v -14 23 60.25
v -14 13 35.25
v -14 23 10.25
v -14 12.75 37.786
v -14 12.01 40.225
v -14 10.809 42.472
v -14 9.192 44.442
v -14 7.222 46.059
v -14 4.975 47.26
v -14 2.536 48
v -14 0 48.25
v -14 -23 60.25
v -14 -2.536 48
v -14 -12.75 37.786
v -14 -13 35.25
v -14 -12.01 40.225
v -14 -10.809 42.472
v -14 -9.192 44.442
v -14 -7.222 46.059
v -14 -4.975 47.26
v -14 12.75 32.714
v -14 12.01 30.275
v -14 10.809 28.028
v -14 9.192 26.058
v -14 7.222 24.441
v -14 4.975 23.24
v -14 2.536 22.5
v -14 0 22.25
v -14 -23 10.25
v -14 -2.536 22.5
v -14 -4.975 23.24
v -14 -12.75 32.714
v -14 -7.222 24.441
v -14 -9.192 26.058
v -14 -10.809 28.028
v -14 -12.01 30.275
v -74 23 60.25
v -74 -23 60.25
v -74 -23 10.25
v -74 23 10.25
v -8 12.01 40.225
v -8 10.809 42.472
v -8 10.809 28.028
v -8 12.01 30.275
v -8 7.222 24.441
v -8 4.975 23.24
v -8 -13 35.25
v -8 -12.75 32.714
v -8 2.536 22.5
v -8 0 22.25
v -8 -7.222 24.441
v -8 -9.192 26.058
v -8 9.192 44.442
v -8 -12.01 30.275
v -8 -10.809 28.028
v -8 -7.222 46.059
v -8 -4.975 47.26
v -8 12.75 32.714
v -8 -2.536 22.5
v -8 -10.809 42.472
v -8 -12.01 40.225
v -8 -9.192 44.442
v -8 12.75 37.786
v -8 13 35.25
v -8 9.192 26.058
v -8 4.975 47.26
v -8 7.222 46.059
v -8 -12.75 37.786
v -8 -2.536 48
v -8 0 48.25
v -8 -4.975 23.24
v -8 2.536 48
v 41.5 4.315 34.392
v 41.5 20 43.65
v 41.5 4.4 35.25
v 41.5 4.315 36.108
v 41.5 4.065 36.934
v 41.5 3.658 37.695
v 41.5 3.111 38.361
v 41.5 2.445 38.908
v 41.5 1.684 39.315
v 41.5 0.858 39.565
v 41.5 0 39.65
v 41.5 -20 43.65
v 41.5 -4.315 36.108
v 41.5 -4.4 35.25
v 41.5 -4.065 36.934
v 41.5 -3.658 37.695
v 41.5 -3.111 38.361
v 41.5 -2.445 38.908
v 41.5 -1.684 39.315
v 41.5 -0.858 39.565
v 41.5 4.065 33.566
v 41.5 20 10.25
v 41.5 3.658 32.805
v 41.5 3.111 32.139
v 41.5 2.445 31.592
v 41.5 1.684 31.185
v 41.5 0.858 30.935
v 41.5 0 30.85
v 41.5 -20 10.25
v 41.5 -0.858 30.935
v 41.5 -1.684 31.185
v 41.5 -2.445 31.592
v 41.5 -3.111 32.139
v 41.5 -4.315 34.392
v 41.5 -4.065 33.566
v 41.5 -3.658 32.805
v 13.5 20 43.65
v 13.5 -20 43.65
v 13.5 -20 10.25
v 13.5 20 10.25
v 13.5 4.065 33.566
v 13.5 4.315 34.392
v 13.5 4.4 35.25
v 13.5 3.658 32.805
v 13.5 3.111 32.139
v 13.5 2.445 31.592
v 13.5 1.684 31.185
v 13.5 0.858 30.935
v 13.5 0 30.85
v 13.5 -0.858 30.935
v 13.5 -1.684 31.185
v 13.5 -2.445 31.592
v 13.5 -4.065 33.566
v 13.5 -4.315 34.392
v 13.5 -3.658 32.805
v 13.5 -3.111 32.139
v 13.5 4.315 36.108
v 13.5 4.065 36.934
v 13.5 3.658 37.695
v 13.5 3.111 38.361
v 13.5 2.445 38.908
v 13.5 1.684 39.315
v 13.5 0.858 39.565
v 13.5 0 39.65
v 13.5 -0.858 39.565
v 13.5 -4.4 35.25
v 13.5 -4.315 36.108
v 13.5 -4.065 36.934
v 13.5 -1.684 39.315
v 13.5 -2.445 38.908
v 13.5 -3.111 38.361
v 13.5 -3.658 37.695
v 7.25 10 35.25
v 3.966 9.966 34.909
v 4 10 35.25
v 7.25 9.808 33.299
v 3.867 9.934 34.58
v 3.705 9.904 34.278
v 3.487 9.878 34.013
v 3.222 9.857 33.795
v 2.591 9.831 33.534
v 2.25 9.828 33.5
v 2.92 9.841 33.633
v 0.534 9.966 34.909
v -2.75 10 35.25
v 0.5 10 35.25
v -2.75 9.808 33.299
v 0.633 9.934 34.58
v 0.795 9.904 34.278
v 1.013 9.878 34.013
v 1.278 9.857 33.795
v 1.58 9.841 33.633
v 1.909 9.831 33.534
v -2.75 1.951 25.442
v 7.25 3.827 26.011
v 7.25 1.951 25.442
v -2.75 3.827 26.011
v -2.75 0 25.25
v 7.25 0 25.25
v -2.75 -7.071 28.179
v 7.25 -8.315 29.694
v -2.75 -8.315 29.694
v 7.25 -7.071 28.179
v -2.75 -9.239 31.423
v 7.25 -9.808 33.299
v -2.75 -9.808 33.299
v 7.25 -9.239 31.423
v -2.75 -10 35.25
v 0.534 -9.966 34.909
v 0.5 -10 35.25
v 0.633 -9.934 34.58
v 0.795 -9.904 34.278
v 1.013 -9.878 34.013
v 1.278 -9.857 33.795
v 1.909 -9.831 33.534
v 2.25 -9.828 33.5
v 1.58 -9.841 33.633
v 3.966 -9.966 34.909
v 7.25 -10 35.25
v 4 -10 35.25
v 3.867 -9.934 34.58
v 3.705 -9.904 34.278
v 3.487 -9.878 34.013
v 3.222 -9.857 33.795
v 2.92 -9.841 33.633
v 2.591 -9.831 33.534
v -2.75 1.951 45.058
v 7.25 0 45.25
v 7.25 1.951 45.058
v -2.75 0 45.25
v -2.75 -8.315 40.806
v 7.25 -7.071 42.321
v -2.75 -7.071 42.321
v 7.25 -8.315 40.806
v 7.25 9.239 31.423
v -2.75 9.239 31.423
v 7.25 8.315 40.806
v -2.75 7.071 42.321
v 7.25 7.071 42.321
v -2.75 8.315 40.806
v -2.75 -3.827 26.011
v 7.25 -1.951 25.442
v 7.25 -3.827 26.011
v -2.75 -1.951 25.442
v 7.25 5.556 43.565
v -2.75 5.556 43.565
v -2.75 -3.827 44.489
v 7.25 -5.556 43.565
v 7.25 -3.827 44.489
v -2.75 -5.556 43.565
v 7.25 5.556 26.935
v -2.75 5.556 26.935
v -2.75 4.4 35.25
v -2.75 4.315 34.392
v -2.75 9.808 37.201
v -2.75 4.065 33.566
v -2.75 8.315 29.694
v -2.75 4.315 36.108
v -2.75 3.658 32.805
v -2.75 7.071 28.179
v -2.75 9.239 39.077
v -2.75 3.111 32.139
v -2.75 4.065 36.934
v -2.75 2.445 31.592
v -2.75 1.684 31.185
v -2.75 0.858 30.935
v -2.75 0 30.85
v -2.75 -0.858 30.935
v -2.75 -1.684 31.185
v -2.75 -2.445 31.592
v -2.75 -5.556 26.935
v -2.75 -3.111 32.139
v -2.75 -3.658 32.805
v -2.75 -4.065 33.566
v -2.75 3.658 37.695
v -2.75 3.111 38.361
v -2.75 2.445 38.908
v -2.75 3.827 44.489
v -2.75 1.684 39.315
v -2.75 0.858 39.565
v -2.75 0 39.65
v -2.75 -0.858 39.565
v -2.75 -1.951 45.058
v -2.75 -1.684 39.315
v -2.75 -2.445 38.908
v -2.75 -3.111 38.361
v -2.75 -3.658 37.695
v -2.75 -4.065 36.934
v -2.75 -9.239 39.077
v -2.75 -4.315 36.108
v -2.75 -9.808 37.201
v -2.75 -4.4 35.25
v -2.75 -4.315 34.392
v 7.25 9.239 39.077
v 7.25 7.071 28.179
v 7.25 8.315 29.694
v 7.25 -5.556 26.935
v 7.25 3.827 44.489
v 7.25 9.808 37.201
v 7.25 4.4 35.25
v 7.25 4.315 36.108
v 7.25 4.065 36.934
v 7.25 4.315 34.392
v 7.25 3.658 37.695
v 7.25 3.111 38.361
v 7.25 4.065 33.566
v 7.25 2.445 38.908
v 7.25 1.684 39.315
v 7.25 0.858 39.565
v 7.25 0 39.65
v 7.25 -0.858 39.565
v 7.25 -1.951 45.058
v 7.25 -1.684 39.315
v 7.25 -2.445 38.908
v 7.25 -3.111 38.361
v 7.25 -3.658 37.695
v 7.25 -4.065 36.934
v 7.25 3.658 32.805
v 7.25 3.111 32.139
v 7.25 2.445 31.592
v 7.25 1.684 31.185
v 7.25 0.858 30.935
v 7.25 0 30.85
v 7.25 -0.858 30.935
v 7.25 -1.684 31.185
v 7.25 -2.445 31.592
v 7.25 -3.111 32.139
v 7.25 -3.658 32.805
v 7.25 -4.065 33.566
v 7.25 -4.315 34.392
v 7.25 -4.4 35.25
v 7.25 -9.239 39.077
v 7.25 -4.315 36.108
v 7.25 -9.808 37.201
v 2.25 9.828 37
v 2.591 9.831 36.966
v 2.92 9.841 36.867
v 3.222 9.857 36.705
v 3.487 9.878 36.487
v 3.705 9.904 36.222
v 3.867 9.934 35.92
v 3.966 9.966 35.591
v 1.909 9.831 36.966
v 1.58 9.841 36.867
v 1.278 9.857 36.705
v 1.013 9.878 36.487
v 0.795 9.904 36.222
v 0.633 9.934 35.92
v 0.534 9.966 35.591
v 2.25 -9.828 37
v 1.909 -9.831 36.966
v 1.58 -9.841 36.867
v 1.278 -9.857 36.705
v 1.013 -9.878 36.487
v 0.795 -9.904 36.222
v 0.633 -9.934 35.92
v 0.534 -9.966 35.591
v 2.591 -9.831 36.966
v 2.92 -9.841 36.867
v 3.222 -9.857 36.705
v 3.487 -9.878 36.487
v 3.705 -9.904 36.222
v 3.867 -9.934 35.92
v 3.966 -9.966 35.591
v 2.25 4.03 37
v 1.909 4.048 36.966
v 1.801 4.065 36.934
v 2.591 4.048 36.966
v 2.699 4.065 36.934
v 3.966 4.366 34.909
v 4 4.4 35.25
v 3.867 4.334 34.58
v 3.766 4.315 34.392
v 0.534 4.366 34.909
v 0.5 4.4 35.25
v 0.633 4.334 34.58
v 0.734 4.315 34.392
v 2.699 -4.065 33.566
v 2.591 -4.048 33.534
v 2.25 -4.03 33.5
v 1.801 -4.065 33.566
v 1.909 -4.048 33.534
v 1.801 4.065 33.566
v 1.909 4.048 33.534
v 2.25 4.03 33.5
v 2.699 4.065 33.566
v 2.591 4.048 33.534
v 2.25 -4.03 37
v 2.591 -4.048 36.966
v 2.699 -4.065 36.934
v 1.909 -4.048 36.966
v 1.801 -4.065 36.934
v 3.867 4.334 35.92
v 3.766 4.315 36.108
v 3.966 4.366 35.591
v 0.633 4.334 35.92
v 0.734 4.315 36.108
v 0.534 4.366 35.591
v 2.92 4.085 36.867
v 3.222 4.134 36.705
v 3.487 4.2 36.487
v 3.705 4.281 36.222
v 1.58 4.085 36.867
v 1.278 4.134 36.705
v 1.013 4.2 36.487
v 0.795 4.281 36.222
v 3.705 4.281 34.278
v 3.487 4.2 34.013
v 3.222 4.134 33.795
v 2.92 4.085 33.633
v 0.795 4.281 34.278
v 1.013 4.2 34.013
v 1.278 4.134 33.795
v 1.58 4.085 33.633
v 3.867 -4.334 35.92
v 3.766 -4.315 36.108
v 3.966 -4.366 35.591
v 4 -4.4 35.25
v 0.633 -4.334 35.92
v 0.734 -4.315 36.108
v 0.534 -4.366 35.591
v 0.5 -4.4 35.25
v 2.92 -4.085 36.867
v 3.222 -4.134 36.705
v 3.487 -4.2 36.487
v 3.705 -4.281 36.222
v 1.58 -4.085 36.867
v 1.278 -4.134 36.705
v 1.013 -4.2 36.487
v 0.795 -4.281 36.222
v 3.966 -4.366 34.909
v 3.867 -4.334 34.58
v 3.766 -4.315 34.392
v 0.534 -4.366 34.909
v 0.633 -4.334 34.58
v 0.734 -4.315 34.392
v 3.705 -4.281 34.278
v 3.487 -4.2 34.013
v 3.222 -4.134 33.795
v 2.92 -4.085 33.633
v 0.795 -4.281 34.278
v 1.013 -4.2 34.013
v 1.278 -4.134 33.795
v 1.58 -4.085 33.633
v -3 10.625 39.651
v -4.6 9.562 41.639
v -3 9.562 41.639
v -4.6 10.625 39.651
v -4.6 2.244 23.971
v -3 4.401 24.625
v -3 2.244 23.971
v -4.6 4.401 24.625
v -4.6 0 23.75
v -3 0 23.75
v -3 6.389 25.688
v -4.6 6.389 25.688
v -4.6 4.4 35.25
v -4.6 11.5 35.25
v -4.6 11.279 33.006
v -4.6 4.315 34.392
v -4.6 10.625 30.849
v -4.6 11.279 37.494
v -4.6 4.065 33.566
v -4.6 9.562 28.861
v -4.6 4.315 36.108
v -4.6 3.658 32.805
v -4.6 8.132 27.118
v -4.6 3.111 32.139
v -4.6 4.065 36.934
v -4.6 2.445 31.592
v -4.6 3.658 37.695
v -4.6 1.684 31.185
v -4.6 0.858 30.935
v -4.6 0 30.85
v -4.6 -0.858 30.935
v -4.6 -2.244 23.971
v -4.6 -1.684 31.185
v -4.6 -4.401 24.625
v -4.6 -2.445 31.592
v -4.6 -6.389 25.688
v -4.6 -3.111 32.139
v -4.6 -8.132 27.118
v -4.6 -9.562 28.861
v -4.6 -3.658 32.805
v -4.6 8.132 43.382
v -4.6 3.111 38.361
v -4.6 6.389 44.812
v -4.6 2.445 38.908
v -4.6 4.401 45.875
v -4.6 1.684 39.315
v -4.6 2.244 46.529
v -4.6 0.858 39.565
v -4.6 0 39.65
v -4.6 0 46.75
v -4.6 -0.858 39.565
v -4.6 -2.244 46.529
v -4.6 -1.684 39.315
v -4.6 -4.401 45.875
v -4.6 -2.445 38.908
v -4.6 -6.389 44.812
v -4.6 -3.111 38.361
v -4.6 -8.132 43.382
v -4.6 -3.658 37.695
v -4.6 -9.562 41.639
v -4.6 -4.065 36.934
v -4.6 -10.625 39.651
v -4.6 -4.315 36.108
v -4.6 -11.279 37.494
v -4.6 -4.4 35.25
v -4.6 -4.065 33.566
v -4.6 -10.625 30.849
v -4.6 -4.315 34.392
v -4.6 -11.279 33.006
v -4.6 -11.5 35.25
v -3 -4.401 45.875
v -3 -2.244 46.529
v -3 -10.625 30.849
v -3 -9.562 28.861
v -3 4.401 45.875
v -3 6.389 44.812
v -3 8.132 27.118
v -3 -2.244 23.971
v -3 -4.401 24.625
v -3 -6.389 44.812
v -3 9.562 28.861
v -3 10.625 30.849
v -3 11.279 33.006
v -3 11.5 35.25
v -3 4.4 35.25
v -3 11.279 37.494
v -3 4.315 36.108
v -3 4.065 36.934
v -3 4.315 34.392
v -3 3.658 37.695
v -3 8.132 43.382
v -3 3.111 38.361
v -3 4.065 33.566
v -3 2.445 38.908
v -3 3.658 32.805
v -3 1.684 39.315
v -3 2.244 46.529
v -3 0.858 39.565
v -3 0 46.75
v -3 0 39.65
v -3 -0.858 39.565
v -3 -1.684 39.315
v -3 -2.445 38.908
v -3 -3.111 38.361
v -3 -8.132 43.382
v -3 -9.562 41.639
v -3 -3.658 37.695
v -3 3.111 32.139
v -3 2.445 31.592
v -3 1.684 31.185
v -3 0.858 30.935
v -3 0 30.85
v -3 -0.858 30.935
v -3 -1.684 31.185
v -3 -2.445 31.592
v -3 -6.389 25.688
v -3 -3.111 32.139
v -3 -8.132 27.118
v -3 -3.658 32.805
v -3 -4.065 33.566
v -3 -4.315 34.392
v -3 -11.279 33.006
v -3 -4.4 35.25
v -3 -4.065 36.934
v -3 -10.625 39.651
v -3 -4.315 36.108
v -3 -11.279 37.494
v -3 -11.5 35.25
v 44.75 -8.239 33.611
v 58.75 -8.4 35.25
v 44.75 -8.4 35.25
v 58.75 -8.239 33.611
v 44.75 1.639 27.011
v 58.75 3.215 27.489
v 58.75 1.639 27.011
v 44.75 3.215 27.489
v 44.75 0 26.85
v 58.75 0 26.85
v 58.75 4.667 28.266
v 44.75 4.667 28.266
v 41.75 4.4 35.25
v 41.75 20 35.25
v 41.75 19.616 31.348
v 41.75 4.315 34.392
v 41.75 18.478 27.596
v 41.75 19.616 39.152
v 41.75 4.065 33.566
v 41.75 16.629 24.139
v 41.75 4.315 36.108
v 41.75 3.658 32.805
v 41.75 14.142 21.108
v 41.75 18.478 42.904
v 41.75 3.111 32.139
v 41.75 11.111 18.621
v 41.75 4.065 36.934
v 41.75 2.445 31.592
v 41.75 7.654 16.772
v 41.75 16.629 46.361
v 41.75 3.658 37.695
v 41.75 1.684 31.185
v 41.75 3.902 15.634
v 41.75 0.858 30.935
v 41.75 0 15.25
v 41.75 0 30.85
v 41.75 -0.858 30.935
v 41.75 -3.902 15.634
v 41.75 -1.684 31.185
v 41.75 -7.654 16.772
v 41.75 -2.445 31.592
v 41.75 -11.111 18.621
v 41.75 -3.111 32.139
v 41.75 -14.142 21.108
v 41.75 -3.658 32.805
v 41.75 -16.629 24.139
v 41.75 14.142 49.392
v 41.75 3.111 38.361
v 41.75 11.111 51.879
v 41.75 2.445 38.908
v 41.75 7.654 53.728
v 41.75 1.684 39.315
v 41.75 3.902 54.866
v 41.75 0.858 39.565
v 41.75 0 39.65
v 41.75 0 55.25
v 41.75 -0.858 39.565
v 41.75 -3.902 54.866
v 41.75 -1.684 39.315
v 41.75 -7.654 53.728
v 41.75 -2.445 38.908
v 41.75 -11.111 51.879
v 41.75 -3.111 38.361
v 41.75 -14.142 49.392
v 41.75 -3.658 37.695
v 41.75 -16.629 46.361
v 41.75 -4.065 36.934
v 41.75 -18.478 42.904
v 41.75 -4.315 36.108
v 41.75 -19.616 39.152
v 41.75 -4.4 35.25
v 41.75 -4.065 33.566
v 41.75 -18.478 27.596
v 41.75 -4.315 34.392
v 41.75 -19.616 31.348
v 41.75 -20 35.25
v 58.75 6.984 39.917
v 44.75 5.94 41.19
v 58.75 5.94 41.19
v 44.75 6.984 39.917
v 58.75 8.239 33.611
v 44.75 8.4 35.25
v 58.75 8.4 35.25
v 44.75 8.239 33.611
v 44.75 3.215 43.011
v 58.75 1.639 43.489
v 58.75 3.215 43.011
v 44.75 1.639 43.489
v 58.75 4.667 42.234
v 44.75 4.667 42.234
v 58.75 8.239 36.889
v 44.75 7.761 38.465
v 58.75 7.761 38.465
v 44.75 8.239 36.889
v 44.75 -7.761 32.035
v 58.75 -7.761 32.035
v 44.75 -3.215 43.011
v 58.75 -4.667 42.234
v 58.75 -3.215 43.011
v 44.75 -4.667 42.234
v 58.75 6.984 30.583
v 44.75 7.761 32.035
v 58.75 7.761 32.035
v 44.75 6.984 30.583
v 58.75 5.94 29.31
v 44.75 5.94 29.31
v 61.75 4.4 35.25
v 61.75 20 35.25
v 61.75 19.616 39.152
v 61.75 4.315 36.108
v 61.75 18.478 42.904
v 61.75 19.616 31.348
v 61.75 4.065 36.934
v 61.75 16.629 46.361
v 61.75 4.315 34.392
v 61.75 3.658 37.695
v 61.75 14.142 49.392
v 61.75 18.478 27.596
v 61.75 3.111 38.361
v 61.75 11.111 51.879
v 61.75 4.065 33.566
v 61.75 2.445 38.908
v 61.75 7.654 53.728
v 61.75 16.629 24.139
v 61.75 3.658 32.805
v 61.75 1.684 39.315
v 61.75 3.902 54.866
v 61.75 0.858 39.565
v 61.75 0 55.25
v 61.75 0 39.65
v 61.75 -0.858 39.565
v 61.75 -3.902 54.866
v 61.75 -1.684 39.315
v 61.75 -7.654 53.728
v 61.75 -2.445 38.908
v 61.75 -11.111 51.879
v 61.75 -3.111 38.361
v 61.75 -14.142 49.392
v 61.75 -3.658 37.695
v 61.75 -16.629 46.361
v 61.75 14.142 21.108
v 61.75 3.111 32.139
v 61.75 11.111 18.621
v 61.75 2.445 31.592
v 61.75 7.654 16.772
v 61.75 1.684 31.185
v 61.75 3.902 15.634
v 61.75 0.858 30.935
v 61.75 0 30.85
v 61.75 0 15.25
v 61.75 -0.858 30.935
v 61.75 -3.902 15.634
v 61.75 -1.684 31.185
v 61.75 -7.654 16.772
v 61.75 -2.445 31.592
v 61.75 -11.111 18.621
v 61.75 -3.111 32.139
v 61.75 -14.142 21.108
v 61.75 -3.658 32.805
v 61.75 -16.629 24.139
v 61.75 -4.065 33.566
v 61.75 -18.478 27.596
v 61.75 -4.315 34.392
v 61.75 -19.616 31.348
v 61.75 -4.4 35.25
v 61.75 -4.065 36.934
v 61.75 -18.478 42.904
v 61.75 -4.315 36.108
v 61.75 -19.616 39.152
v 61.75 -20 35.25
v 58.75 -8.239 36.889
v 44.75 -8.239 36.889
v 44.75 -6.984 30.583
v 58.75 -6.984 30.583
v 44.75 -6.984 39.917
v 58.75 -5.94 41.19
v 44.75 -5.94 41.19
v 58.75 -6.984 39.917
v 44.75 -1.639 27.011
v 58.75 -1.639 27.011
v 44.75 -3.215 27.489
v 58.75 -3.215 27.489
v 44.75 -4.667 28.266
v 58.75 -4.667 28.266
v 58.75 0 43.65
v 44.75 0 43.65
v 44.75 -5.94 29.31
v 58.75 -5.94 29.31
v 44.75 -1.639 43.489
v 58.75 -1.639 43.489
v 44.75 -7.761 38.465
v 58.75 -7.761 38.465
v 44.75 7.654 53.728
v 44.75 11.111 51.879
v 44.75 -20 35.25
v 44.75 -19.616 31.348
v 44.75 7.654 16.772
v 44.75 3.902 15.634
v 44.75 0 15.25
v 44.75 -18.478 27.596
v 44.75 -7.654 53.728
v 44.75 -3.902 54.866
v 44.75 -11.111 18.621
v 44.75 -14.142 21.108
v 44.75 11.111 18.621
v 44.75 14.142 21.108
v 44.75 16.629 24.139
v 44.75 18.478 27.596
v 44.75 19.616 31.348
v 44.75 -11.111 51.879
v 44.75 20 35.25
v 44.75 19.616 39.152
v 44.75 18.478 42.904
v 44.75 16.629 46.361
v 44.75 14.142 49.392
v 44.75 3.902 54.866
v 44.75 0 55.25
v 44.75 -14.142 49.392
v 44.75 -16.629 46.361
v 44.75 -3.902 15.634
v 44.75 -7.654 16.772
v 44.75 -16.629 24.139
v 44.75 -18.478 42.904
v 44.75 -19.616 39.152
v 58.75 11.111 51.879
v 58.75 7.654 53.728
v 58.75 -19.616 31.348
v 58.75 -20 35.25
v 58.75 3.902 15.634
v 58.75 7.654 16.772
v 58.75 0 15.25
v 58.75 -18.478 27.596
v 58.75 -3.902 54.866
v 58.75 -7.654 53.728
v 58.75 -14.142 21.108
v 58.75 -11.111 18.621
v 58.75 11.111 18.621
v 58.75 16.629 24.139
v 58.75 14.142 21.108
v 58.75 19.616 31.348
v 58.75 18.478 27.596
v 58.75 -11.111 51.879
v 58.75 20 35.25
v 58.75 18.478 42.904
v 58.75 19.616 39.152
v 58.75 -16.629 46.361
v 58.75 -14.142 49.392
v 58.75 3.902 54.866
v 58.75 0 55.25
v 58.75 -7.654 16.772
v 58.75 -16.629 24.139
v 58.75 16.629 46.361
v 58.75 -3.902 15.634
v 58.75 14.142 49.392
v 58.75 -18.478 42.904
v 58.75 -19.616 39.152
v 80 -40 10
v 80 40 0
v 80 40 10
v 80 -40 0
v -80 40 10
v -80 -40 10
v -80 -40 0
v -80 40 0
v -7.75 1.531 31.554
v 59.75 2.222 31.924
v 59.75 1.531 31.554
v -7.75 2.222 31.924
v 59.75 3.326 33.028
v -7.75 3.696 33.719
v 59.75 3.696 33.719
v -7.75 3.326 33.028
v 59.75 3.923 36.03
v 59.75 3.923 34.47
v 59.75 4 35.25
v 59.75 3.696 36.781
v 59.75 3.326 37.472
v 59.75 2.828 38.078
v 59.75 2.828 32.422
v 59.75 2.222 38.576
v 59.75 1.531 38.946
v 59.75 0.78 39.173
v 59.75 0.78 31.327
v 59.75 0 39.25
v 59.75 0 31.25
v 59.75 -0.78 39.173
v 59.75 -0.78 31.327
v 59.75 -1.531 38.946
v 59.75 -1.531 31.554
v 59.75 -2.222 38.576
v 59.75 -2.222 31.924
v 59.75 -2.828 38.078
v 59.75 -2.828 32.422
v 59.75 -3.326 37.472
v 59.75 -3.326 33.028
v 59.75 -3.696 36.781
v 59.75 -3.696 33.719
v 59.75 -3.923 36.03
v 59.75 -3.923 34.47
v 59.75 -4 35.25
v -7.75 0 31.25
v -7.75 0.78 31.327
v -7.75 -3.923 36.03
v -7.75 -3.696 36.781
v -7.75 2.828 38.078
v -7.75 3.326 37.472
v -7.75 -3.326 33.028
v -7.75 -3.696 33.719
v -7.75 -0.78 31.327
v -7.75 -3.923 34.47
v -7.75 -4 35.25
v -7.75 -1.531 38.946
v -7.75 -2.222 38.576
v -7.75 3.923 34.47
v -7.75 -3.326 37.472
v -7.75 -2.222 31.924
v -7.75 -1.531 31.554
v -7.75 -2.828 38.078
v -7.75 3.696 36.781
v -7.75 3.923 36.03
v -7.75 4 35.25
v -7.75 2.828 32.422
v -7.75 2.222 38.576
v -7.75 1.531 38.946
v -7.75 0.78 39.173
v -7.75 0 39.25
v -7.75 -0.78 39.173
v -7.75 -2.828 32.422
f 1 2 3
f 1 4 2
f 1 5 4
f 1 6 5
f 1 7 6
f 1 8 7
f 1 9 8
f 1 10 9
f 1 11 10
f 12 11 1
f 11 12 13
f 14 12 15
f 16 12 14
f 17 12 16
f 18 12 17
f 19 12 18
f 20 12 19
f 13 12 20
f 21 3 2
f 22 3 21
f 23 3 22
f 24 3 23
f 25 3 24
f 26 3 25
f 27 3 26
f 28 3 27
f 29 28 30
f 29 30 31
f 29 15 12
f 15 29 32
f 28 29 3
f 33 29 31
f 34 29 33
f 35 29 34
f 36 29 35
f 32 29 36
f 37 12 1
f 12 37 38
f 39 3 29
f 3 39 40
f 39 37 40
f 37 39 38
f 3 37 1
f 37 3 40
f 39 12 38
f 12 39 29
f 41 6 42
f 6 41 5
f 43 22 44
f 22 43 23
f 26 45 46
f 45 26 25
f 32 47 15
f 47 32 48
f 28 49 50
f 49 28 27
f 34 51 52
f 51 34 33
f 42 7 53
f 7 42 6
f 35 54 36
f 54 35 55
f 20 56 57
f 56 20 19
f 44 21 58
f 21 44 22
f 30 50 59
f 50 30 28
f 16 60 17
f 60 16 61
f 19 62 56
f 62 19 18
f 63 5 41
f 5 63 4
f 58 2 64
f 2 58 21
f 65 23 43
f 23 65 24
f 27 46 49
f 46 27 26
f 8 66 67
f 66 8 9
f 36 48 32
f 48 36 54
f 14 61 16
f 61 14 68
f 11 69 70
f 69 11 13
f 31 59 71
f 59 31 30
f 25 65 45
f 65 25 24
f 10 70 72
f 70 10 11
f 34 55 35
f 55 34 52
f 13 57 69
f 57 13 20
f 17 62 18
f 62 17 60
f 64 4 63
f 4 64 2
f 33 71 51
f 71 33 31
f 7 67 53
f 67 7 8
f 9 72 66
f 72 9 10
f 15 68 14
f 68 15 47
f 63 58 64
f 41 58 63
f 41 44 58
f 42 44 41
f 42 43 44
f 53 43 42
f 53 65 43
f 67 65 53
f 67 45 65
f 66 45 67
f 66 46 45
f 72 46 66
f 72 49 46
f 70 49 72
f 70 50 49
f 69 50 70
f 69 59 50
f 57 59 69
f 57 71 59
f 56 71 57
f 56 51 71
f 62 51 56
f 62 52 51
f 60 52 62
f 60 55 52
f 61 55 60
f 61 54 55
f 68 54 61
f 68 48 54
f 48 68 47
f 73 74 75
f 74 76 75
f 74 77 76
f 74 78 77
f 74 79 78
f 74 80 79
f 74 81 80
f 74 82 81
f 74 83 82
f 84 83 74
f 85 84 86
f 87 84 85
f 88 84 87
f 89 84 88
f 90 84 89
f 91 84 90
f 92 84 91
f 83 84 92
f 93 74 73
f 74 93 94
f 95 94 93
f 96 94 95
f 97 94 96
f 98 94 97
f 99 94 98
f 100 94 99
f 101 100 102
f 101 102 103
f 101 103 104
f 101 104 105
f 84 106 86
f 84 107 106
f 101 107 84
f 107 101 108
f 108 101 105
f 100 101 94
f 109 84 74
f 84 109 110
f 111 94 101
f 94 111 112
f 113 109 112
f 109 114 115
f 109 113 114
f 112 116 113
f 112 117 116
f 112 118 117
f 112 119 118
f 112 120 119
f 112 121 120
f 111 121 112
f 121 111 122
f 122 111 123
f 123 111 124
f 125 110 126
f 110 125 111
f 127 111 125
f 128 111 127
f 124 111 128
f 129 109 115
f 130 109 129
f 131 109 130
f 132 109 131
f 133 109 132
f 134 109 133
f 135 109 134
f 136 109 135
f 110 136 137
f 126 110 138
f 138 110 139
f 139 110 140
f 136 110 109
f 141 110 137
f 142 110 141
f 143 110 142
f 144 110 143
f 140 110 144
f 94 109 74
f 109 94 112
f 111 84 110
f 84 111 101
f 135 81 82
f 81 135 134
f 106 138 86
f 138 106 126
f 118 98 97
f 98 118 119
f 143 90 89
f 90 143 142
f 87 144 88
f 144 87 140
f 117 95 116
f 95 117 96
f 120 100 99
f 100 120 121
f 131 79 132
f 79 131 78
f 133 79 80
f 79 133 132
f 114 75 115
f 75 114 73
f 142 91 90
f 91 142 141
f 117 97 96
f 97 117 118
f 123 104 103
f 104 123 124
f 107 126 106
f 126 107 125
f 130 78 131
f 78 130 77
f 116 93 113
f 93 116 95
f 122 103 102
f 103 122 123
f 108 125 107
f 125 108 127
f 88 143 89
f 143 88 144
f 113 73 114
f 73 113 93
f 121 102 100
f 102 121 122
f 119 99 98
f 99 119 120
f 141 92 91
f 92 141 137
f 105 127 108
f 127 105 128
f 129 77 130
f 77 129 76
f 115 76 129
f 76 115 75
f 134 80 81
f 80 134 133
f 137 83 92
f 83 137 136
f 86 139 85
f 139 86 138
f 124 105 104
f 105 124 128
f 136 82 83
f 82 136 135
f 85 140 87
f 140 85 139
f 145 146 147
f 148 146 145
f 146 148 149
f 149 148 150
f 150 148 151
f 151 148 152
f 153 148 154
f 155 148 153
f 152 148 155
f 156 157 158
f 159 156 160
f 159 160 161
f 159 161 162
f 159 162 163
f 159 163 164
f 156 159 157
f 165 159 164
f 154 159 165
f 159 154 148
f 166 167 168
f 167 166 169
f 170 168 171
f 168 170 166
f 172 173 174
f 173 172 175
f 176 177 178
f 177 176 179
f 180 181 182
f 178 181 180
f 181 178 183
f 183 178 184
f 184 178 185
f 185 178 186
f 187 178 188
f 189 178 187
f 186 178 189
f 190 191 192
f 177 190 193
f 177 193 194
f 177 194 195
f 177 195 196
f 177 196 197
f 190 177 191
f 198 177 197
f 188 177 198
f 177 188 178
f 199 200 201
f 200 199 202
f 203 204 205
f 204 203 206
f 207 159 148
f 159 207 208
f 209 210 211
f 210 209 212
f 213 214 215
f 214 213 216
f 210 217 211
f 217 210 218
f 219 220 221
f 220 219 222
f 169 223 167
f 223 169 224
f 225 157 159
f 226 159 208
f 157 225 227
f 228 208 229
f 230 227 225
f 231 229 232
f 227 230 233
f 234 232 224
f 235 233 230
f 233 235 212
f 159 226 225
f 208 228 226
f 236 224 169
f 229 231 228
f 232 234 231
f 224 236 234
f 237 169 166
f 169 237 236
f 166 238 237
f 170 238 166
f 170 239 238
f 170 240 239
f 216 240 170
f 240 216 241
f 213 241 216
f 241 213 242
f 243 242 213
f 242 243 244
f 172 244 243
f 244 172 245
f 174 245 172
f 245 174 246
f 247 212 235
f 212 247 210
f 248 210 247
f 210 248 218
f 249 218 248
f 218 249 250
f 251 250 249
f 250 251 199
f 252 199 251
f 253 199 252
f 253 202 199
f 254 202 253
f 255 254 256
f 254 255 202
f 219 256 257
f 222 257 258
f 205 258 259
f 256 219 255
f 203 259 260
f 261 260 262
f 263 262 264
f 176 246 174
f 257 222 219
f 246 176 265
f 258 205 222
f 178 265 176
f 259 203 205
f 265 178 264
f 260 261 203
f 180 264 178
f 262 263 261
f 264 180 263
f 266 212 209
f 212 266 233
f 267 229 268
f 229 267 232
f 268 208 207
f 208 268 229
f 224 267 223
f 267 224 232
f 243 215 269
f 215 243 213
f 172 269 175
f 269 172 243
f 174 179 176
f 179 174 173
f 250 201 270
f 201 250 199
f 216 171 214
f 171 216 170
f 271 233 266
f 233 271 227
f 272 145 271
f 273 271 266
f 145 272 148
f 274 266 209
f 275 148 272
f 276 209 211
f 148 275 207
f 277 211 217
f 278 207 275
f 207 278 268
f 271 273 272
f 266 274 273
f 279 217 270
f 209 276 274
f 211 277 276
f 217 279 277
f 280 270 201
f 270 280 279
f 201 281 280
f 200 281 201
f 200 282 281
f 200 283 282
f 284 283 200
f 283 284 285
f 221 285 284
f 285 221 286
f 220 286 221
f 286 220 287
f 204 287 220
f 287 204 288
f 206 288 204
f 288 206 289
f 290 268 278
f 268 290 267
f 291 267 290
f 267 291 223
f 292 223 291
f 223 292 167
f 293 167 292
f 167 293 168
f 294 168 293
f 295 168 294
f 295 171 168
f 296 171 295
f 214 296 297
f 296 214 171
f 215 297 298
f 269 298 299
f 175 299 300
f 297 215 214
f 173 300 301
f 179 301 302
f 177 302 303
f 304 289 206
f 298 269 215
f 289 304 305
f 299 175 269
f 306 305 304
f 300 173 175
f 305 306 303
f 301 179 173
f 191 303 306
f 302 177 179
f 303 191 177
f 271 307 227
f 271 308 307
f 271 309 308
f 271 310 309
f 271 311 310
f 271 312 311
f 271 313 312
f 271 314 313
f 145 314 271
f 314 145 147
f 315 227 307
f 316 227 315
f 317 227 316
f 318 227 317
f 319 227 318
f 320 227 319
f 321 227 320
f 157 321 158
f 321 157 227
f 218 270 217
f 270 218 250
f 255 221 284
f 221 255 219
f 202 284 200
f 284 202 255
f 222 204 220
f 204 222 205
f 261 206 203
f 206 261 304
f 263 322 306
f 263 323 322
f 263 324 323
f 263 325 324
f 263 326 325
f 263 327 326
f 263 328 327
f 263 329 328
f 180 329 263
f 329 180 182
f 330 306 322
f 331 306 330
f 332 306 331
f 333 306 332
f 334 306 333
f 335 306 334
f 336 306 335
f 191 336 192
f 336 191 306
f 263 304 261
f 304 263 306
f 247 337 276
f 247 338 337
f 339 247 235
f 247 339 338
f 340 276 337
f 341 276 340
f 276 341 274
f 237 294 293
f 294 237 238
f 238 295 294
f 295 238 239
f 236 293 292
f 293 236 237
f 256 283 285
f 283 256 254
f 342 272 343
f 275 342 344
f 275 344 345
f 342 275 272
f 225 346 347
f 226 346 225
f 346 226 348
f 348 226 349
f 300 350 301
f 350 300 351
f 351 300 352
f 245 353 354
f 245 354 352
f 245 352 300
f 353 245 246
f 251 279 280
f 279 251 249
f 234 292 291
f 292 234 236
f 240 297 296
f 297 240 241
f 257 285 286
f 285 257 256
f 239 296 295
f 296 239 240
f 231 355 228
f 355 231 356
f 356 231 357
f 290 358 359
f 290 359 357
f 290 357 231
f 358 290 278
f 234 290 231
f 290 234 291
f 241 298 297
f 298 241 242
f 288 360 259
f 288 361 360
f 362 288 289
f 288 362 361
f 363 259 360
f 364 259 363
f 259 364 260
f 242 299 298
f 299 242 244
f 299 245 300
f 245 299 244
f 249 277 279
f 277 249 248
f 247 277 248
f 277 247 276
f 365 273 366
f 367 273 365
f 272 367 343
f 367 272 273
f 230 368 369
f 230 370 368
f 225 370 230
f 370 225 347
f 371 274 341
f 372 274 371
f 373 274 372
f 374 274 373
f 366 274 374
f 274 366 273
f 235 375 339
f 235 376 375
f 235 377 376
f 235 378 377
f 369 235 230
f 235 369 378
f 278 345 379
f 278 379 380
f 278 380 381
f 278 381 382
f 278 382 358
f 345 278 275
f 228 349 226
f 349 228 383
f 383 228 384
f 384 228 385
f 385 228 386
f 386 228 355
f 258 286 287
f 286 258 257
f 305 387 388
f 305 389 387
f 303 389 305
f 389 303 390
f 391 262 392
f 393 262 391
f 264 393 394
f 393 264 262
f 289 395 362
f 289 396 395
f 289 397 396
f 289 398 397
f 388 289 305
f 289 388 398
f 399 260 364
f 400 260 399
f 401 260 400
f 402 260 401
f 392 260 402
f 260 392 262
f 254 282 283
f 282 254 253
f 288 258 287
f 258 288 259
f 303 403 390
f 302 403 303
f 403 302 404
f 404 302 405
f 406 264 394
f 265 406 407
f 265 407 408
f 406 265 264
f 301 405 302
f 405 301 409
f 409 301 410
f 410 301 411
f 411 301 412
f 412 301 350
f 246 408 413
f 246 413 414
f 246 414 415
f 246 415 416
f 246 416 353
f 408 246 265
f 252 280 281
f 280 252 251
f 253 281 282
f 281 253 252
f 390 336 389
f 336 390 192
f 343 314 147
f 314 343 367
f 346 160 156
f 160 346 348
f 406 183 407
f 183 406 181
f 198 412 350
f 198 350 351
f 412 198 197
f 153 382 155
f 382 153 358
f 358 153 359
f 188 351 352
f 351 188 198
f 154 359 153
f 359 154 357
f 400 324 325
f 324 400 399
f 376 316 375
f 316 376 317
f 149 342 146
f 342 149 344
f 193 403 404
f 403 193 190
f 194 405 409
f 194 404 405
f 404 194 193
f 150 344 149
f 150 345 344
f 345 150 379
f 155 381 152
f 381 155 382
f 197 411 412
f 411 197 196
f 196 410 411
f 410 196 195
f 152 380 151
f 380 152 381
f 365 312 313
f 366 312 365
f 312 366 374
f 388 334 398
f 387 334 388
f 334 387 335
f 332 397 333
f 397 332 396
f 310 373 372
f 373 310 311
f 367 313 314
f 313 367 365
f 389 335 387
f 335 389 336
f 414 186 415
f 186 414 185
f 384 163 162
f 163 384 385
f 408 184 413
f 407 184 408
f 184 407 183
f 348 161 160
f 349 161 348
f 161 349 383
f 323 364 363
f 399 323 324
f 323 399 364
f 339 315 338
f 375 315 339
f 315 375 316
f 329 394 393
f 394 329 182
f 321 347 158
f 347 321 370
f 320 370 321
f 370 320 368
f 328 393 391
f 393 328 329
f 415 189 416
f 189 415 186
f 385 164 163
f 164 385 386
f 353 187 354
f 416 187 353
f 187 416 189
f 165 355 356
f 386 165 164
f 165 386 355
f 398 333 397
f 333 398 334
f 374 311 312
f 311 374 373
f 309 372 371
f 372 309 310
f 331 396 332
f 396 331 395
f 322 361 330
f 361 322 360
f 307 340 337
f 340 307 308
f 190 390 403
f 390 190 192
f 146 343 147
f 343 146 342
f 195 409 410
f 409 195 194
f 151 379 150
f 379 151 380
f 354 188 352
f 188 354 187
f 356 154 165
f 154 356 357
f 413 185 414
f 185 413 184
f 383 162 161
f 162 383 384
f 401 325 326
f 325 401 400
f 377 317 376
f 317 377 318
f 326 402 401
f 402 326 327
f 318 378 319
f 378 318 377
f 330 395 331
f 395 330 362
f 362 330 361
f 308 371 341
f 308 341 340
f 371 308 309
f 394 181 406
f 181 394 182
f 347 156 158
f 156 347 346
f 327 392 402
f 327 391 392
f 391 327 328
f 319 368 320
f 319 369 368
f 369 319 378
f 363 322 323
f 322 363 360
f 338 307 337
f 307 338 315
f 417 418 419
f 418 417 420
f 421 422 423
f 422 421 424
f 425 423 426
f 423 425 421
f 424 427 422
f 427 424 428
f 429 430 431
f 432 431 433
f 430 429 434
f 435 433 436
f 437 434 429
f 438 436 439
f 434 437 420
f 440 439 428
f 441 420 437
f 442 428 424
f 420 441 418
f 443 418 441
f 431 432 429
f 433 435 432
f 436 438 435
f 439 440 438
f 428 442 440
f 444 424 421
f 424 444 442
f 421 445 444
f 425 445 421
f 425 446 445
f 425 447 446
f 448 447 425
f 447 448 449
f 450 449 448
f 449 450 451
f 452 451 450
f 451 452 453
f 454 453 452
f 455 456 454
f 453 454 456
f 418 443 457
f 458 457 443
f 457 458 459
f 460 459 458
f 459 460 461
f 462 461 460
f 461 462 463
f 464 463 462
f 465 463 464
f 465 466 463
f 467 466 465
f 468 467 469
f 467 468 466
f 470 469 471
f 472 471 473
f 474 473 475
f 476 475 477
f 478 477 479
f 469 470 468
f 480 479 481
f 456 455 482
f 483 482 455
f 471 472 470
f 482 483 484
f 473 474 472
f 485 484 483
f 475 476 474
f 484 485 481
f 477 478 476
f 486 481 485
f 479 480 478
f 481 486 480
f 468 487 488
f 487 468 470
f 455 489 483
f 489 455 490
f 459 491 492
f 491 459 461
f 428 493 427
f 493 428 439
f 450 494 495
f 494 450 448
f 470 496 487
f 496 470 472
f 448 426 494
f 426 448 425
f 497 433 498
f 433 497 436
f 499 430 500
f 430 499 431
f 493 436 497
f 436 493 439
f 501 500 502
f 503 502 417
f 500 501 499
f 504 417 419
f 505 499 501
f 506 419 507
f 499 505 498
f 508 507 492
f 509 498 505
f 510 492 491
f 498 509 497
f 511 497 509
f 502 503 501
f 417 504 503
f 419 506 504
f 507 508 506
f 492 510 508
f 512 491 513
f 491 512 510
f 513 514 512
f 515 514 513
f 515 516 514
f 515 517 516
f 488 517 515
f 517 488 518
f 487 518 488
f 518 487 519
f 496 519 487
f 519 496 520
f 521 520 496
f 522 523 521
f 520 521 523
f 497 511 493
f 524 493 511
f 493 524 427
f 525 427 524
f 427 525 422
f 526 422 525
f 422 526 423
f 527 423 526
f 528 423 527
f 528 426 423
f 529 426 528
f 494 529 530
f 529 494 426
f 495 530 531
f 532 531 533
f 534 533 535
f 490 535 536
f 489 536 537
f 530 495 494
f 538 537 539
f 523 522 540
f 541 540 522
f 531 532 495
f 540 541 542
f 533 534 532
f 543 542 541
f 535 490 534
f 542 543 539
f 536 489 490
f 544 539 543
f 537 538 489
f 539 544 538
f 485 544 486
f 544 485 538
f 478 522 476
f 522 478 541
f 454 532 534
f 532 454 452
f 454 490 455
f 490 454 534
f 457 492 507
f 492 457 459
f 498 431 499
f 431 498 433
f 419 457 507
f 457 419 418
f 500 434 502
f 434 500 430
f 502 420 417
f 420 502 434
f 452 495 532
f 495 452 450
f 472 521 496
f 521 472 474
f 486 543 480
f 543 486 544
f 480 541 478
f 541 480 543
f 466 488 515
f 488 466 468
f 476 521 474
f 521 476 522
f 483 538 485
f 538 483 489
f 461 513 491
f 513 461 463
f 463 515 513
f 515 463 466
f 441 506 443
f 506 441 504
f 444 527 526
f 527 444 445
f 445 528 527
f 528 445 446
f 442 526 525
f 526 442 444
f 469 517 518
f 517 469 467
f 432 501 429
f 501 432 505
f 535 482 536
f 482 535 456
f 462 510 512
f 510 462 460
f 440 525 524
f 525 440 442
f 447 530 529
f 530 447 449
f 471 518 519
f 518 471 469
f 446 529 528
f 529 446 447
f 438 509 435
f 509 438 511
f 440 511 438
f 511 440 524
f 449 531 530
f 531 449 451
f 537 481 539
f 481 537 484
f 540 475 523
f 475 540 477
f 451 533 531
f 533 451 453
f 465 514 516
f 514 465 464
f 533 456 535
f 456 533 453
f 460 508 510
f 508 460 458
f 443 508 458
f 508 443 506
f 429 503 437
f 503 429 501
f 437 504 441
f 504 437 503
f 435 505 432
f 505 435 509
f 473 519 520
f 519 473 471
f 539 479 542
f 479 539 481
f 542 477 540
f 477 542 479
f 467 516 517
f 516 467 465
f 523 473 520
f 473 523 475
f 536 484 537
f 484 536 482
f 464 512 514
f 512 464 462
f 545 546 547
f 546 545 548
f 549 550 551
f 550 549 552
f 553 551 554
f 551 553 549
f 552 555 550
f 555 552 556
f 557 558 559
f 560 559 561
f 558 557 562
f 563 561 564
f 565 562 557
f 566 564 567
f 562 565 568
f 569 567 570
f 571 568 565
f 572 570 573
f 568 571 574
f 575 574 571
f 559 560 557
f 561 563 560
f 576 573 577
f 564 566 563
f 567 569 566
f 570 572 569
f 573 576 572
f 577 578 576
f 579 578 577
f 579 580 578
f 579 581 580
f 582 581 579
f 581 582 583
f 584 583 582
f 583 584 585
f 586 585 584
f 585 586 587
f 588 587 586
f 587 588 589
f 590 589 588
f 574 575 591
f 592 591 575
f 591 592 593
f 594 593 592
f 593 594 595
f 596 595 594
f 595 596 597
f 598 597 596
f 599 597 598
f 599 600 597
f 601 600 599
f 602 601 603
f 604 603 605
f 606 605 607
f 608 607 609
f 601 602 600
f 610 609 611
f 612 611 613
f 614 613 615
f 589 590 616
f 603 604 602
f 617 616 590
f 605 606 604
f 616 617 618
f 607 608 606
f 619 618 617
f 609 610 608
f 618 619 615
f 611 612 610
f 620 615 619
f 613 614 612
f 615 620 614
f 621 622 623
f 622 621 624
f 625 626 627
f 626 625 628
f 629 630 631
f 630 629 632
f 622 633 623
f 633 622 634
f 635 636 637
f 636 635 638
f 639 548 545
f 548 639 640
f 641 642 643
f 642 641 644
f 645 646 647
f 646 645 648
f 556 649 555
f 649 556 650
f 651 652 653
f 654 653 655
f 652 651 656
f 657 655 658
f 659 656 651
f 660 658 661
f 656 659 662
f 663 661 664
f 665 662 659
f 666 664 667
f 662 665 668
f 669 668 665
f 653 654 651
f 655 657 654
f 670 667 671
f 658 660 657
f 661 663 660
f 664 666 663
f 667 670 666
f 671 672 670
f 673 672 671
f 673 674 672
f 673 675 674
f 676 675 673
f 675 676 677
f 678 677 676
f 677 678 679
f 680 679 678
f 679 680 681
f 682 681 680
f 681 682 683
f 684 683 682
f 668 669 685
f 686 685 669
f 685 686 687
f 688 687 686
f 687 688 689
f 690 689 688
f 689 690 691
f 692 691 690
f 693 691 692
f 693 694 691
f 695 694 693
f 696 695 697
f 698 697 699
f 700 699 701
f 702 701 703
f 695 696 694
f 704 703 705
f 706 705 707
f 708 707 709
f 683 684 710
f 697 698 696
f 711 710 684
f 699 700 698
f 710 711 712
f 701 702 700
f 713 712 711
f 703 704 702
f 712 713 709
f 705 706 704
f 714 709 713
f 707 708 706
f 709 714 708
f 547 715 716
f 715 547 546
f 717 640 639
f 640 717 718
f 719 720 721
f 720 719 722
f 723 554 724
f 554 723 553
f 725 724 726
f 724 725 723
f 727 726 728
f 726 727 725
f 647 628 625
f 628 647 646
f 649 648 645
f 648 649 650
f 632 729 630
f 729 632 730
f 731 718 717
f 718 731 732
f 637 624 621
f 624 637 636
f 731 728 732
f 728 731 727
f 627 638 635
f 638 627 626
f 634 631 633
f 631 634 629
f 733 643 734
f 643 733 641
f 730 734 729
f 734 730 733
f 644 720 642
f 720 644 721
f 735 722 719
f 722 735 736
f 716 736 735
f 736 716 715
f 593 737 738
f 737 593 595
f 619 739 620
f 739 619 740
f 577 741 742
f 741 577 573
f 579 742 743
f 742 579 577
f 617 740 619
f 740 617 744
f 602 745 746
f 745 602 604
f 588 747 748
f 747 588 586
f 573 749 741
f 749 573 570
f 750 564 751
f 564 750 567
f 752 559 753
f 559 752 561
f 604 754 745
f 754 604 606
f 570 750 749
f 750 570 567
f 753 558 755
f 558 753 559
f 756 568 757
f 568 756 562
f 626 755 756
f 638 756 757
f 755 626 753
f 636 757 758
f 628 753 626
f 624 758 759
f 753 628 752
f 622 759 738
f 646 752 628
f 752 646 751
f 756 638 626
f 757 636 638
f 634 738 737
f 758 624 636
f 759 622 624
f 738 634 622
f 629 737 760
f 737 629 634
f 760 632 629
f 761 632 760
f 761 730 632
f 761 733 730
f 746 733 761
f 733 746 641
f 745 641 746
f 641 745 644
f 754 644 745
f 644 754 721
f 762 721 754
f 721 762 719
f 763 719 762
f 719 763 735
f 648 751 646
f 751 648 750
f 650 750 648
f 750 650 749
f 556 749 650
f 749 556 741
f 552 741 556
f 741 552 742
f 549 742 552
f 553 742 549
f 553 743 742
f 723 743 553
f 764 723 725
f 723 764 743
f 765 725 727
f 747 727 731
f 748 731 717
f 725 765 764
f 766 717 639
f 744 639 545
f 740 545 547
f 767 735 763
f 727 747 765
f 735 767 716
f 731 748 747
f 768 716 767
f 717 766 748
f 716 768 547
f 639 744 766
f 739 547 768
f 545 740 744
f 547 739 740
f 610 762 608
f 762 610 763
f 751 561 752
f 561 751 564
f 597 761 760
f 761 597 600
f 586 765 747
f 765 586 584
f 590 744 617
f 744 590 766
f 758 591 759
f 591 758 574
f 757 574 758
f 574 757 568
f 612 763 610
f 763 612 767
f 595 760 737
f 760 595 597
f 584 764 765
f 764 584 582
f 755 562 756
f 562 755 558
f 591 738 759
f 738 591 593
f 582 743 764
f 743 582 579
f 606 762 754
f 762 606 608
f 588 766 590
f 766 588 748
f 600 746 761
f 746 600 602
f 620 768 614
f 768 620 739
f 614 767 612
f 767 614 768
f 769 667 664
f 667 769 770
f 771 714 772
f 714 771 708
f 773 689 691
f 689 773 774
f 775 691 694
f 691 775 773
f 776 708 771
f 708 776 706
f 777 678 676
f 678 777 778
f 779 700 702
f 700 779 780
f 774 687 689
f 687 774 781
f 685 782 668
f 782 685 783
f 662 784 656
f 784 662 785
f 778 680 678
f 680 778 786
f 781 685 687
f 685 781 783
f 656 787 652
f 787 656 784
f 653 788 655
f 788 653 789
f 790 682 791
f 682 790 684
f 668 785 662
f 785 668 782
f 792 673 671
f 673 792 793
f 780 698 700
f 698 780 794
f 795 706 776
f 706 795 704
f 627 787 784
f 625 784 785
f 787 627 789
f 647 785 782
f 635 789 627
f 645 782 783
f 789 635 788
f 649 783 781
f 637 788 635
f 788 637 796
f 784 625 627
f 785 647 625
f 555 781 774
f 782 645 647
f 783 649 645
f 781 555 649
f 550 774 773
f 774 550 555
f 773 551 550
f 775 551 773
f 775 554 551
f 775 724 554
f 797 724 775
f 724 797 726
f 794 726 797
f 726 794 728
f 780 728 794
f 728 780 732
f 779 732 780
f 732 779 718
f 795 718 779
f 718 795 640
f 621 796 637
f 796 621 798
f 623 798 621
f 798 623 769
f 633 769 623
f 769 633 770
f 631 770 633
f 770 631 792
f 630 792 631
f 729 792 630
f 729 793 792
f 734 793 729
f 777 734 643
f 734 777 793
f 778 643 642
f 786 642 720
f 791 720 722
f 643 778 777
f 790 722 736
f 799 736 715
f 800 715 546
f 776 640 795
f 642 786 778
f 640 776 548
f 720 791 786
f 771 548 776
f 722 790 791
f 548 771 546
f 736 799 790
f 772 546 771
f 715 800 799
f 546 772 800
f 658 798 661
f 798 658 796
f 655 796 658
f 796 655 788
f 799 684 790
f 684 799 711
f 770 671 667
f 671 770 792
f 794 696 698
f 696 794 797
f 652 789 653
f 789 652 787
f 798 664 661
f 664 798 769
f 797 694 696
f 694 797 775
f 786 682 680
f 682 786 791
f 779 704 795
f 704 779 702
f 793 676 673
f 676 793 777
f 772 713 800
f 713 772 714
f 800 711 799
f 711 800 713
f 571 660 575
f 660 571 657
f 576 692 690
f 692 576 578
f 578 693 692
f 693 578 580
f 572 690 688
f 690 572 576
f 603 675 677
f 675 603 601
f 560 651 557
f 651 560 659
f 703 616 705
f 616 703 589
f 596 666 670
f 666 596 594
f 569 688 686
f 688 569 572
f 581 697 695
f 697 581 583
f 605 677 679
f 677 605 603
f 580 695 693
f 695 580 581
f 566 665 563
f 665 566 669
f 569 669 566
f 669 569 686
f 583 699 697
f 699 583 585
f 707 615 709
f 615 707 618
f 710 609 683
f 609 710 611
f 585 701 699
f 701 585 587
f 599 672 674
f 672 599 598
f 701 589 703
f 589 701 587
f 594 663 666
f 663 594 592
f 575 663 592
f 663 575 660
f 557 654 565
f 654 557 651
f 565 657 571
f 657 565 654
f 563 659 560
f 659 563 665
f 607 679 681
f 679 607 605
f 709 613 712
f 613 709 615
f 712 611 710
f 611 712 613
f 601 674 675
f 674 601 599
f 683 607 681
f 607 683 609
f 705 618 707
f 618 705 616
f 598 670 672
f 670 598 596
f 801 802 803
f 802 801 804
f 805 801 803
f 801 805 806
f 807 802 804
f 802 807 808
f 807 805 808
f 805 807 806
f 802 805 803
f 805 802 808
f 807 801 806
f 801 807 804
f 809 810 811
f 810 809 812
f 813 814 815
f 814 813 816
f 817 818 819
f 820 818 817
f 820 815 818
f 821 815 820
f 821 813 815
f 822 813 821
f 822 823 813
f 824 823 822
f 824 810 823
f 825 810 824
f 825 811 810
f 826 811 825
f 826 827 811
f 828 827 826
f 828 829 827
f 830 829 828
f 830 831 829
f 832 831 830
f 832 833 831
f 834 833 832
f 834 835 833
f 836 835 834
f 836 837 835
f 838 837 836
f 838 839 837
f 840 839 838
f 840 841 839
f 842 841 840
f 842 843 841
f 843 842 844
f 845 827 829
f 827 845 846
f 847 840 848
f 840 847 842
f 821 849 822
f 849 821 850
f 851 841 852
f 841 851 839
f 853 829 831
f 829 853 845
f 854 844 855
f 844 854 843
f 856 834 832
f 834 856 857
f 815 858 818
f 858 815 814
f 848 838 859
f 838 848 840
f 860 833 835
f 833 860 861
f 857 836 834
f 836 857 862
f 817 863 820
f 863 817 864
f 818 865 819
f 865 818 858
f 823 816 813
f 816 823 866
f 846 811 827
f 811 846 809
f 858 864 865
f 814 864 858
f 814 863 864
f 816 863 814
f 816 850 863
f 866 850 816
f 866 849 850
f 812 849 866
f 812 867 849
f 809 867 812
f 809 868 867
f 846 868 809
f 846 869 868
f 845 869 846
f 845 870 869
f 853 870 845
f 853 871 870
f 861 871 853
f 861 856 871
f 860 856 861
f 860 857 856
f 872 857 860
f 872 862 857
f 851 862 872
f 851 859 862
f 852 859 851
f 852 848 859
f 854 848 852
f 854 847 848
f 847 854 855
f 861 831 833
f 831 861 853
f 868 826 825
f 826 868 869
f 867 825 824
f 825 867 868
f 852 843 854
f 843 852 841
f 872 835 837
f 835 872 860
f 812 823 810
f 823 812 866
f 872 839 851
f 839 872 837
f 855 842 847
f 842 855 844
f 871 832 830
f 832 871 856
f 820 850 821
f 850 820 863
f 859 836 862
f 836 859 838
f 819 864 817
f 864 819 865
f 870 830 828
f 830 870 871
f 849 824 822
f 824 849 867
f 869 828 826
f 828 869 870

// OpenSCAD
$fn = 32;

// ------------------------------------------------------------------------
// Motor drive station: motor 60 x 50 mm, shaft d8, pulley d40
// Every part is its own module, assembly() places every instance.
// ------------------------------------------------------------------------

// --- part 1 ---
module station_bed() {
  difference() {
    translate([-80, -40, 0]) cube([160, 80, 10]);
  }
}

// --- part 2 ---
module drive_motor() {
  union() {
    translate([-30, -23, 0]) cube([60, 46, 50]);
    translate([33, 0, 25]) rotate([0, 90, 0]) cylinder(h = 6, d = 26, center = true);
  }
}

// --- part 3 ---
module pillow_block() {
  difference() {
    translate([-14, -20, 0]) cube([28, 40, 33.4]);
    translate([0, 0, 25]) rotate([0, 90, 0]) cylinder(h = 30, d = 8.8, center = true);
  }
}

// --- part 4 ---
module drive_shaft() {
  translate([0, 0, -33.75]) cylinder(h = 67.5, d = 8);
}

// --- part 5 ---
module shaft_collar() {
  difference() {
    cylinder(h = 10, d = 20);
    translate([0, 0, -1]) cylinder(h = 12, d = 8.8);
    translate([0, 0, 5]) rotate([90, 0, 0]) cylinder(h = 22, d = 3.5, center = true);
  }
}

// --- part 6 ---
module collar_washer() {
  difference() {
      translate([0, 0, 0]) cylinder(h = 1.6, d = 23);
      translate([0, 0, -1]) cylinder(h = 3.6, d = 8.8);
    }
}

// --- part 7 ---
module drive_pulley() {
  difference() {
    union() {
      cylinder(h = 20, d = 16.8);
      cylinder(h = 3, d = 40);
      translate([0, 0, 17]) cylinder(h = 3, d = 40);
    }
    translate([0, 0, -1]) cylinder(h = 22, d = 8.8);
  }
}

// --- assembly ---
module assembly() {
  color([0.80, 0.24, 0.20]) translate([0, 0, 0]) rotate([0, 0, 0]) station_bed();
  color([0.20, 0.45, 0.75]) translate([-44, 0, 10.25]) rotate([0, 0, 0]) drive_motor();
  color([0.25, 0.62, 0.32]) translate([27.5, 0, 10.25]) rotate([0, 0, 0]) pillow_block();
  color([0.92, 0.70, 0.18]) translate([26, 0, 35.25]) rotate([0, 90, 0]) drive_shaft();
  color([0.58, 0.35, 0.70]) translate([-2.75, 0, 35.25]) rotate([0, 90, 0]) shaft_collar();
  color([0.16, 0.66, 0.66]) translate([-4.6, 0, 35.25]) rotate([0, 90, 0]) collar_washer();
  color([0.85, 0.48, 0.18]) translate([41.75, 0, 35.25]) rotate([0, 90, 0]) drive_pulley();
}

assembly();
